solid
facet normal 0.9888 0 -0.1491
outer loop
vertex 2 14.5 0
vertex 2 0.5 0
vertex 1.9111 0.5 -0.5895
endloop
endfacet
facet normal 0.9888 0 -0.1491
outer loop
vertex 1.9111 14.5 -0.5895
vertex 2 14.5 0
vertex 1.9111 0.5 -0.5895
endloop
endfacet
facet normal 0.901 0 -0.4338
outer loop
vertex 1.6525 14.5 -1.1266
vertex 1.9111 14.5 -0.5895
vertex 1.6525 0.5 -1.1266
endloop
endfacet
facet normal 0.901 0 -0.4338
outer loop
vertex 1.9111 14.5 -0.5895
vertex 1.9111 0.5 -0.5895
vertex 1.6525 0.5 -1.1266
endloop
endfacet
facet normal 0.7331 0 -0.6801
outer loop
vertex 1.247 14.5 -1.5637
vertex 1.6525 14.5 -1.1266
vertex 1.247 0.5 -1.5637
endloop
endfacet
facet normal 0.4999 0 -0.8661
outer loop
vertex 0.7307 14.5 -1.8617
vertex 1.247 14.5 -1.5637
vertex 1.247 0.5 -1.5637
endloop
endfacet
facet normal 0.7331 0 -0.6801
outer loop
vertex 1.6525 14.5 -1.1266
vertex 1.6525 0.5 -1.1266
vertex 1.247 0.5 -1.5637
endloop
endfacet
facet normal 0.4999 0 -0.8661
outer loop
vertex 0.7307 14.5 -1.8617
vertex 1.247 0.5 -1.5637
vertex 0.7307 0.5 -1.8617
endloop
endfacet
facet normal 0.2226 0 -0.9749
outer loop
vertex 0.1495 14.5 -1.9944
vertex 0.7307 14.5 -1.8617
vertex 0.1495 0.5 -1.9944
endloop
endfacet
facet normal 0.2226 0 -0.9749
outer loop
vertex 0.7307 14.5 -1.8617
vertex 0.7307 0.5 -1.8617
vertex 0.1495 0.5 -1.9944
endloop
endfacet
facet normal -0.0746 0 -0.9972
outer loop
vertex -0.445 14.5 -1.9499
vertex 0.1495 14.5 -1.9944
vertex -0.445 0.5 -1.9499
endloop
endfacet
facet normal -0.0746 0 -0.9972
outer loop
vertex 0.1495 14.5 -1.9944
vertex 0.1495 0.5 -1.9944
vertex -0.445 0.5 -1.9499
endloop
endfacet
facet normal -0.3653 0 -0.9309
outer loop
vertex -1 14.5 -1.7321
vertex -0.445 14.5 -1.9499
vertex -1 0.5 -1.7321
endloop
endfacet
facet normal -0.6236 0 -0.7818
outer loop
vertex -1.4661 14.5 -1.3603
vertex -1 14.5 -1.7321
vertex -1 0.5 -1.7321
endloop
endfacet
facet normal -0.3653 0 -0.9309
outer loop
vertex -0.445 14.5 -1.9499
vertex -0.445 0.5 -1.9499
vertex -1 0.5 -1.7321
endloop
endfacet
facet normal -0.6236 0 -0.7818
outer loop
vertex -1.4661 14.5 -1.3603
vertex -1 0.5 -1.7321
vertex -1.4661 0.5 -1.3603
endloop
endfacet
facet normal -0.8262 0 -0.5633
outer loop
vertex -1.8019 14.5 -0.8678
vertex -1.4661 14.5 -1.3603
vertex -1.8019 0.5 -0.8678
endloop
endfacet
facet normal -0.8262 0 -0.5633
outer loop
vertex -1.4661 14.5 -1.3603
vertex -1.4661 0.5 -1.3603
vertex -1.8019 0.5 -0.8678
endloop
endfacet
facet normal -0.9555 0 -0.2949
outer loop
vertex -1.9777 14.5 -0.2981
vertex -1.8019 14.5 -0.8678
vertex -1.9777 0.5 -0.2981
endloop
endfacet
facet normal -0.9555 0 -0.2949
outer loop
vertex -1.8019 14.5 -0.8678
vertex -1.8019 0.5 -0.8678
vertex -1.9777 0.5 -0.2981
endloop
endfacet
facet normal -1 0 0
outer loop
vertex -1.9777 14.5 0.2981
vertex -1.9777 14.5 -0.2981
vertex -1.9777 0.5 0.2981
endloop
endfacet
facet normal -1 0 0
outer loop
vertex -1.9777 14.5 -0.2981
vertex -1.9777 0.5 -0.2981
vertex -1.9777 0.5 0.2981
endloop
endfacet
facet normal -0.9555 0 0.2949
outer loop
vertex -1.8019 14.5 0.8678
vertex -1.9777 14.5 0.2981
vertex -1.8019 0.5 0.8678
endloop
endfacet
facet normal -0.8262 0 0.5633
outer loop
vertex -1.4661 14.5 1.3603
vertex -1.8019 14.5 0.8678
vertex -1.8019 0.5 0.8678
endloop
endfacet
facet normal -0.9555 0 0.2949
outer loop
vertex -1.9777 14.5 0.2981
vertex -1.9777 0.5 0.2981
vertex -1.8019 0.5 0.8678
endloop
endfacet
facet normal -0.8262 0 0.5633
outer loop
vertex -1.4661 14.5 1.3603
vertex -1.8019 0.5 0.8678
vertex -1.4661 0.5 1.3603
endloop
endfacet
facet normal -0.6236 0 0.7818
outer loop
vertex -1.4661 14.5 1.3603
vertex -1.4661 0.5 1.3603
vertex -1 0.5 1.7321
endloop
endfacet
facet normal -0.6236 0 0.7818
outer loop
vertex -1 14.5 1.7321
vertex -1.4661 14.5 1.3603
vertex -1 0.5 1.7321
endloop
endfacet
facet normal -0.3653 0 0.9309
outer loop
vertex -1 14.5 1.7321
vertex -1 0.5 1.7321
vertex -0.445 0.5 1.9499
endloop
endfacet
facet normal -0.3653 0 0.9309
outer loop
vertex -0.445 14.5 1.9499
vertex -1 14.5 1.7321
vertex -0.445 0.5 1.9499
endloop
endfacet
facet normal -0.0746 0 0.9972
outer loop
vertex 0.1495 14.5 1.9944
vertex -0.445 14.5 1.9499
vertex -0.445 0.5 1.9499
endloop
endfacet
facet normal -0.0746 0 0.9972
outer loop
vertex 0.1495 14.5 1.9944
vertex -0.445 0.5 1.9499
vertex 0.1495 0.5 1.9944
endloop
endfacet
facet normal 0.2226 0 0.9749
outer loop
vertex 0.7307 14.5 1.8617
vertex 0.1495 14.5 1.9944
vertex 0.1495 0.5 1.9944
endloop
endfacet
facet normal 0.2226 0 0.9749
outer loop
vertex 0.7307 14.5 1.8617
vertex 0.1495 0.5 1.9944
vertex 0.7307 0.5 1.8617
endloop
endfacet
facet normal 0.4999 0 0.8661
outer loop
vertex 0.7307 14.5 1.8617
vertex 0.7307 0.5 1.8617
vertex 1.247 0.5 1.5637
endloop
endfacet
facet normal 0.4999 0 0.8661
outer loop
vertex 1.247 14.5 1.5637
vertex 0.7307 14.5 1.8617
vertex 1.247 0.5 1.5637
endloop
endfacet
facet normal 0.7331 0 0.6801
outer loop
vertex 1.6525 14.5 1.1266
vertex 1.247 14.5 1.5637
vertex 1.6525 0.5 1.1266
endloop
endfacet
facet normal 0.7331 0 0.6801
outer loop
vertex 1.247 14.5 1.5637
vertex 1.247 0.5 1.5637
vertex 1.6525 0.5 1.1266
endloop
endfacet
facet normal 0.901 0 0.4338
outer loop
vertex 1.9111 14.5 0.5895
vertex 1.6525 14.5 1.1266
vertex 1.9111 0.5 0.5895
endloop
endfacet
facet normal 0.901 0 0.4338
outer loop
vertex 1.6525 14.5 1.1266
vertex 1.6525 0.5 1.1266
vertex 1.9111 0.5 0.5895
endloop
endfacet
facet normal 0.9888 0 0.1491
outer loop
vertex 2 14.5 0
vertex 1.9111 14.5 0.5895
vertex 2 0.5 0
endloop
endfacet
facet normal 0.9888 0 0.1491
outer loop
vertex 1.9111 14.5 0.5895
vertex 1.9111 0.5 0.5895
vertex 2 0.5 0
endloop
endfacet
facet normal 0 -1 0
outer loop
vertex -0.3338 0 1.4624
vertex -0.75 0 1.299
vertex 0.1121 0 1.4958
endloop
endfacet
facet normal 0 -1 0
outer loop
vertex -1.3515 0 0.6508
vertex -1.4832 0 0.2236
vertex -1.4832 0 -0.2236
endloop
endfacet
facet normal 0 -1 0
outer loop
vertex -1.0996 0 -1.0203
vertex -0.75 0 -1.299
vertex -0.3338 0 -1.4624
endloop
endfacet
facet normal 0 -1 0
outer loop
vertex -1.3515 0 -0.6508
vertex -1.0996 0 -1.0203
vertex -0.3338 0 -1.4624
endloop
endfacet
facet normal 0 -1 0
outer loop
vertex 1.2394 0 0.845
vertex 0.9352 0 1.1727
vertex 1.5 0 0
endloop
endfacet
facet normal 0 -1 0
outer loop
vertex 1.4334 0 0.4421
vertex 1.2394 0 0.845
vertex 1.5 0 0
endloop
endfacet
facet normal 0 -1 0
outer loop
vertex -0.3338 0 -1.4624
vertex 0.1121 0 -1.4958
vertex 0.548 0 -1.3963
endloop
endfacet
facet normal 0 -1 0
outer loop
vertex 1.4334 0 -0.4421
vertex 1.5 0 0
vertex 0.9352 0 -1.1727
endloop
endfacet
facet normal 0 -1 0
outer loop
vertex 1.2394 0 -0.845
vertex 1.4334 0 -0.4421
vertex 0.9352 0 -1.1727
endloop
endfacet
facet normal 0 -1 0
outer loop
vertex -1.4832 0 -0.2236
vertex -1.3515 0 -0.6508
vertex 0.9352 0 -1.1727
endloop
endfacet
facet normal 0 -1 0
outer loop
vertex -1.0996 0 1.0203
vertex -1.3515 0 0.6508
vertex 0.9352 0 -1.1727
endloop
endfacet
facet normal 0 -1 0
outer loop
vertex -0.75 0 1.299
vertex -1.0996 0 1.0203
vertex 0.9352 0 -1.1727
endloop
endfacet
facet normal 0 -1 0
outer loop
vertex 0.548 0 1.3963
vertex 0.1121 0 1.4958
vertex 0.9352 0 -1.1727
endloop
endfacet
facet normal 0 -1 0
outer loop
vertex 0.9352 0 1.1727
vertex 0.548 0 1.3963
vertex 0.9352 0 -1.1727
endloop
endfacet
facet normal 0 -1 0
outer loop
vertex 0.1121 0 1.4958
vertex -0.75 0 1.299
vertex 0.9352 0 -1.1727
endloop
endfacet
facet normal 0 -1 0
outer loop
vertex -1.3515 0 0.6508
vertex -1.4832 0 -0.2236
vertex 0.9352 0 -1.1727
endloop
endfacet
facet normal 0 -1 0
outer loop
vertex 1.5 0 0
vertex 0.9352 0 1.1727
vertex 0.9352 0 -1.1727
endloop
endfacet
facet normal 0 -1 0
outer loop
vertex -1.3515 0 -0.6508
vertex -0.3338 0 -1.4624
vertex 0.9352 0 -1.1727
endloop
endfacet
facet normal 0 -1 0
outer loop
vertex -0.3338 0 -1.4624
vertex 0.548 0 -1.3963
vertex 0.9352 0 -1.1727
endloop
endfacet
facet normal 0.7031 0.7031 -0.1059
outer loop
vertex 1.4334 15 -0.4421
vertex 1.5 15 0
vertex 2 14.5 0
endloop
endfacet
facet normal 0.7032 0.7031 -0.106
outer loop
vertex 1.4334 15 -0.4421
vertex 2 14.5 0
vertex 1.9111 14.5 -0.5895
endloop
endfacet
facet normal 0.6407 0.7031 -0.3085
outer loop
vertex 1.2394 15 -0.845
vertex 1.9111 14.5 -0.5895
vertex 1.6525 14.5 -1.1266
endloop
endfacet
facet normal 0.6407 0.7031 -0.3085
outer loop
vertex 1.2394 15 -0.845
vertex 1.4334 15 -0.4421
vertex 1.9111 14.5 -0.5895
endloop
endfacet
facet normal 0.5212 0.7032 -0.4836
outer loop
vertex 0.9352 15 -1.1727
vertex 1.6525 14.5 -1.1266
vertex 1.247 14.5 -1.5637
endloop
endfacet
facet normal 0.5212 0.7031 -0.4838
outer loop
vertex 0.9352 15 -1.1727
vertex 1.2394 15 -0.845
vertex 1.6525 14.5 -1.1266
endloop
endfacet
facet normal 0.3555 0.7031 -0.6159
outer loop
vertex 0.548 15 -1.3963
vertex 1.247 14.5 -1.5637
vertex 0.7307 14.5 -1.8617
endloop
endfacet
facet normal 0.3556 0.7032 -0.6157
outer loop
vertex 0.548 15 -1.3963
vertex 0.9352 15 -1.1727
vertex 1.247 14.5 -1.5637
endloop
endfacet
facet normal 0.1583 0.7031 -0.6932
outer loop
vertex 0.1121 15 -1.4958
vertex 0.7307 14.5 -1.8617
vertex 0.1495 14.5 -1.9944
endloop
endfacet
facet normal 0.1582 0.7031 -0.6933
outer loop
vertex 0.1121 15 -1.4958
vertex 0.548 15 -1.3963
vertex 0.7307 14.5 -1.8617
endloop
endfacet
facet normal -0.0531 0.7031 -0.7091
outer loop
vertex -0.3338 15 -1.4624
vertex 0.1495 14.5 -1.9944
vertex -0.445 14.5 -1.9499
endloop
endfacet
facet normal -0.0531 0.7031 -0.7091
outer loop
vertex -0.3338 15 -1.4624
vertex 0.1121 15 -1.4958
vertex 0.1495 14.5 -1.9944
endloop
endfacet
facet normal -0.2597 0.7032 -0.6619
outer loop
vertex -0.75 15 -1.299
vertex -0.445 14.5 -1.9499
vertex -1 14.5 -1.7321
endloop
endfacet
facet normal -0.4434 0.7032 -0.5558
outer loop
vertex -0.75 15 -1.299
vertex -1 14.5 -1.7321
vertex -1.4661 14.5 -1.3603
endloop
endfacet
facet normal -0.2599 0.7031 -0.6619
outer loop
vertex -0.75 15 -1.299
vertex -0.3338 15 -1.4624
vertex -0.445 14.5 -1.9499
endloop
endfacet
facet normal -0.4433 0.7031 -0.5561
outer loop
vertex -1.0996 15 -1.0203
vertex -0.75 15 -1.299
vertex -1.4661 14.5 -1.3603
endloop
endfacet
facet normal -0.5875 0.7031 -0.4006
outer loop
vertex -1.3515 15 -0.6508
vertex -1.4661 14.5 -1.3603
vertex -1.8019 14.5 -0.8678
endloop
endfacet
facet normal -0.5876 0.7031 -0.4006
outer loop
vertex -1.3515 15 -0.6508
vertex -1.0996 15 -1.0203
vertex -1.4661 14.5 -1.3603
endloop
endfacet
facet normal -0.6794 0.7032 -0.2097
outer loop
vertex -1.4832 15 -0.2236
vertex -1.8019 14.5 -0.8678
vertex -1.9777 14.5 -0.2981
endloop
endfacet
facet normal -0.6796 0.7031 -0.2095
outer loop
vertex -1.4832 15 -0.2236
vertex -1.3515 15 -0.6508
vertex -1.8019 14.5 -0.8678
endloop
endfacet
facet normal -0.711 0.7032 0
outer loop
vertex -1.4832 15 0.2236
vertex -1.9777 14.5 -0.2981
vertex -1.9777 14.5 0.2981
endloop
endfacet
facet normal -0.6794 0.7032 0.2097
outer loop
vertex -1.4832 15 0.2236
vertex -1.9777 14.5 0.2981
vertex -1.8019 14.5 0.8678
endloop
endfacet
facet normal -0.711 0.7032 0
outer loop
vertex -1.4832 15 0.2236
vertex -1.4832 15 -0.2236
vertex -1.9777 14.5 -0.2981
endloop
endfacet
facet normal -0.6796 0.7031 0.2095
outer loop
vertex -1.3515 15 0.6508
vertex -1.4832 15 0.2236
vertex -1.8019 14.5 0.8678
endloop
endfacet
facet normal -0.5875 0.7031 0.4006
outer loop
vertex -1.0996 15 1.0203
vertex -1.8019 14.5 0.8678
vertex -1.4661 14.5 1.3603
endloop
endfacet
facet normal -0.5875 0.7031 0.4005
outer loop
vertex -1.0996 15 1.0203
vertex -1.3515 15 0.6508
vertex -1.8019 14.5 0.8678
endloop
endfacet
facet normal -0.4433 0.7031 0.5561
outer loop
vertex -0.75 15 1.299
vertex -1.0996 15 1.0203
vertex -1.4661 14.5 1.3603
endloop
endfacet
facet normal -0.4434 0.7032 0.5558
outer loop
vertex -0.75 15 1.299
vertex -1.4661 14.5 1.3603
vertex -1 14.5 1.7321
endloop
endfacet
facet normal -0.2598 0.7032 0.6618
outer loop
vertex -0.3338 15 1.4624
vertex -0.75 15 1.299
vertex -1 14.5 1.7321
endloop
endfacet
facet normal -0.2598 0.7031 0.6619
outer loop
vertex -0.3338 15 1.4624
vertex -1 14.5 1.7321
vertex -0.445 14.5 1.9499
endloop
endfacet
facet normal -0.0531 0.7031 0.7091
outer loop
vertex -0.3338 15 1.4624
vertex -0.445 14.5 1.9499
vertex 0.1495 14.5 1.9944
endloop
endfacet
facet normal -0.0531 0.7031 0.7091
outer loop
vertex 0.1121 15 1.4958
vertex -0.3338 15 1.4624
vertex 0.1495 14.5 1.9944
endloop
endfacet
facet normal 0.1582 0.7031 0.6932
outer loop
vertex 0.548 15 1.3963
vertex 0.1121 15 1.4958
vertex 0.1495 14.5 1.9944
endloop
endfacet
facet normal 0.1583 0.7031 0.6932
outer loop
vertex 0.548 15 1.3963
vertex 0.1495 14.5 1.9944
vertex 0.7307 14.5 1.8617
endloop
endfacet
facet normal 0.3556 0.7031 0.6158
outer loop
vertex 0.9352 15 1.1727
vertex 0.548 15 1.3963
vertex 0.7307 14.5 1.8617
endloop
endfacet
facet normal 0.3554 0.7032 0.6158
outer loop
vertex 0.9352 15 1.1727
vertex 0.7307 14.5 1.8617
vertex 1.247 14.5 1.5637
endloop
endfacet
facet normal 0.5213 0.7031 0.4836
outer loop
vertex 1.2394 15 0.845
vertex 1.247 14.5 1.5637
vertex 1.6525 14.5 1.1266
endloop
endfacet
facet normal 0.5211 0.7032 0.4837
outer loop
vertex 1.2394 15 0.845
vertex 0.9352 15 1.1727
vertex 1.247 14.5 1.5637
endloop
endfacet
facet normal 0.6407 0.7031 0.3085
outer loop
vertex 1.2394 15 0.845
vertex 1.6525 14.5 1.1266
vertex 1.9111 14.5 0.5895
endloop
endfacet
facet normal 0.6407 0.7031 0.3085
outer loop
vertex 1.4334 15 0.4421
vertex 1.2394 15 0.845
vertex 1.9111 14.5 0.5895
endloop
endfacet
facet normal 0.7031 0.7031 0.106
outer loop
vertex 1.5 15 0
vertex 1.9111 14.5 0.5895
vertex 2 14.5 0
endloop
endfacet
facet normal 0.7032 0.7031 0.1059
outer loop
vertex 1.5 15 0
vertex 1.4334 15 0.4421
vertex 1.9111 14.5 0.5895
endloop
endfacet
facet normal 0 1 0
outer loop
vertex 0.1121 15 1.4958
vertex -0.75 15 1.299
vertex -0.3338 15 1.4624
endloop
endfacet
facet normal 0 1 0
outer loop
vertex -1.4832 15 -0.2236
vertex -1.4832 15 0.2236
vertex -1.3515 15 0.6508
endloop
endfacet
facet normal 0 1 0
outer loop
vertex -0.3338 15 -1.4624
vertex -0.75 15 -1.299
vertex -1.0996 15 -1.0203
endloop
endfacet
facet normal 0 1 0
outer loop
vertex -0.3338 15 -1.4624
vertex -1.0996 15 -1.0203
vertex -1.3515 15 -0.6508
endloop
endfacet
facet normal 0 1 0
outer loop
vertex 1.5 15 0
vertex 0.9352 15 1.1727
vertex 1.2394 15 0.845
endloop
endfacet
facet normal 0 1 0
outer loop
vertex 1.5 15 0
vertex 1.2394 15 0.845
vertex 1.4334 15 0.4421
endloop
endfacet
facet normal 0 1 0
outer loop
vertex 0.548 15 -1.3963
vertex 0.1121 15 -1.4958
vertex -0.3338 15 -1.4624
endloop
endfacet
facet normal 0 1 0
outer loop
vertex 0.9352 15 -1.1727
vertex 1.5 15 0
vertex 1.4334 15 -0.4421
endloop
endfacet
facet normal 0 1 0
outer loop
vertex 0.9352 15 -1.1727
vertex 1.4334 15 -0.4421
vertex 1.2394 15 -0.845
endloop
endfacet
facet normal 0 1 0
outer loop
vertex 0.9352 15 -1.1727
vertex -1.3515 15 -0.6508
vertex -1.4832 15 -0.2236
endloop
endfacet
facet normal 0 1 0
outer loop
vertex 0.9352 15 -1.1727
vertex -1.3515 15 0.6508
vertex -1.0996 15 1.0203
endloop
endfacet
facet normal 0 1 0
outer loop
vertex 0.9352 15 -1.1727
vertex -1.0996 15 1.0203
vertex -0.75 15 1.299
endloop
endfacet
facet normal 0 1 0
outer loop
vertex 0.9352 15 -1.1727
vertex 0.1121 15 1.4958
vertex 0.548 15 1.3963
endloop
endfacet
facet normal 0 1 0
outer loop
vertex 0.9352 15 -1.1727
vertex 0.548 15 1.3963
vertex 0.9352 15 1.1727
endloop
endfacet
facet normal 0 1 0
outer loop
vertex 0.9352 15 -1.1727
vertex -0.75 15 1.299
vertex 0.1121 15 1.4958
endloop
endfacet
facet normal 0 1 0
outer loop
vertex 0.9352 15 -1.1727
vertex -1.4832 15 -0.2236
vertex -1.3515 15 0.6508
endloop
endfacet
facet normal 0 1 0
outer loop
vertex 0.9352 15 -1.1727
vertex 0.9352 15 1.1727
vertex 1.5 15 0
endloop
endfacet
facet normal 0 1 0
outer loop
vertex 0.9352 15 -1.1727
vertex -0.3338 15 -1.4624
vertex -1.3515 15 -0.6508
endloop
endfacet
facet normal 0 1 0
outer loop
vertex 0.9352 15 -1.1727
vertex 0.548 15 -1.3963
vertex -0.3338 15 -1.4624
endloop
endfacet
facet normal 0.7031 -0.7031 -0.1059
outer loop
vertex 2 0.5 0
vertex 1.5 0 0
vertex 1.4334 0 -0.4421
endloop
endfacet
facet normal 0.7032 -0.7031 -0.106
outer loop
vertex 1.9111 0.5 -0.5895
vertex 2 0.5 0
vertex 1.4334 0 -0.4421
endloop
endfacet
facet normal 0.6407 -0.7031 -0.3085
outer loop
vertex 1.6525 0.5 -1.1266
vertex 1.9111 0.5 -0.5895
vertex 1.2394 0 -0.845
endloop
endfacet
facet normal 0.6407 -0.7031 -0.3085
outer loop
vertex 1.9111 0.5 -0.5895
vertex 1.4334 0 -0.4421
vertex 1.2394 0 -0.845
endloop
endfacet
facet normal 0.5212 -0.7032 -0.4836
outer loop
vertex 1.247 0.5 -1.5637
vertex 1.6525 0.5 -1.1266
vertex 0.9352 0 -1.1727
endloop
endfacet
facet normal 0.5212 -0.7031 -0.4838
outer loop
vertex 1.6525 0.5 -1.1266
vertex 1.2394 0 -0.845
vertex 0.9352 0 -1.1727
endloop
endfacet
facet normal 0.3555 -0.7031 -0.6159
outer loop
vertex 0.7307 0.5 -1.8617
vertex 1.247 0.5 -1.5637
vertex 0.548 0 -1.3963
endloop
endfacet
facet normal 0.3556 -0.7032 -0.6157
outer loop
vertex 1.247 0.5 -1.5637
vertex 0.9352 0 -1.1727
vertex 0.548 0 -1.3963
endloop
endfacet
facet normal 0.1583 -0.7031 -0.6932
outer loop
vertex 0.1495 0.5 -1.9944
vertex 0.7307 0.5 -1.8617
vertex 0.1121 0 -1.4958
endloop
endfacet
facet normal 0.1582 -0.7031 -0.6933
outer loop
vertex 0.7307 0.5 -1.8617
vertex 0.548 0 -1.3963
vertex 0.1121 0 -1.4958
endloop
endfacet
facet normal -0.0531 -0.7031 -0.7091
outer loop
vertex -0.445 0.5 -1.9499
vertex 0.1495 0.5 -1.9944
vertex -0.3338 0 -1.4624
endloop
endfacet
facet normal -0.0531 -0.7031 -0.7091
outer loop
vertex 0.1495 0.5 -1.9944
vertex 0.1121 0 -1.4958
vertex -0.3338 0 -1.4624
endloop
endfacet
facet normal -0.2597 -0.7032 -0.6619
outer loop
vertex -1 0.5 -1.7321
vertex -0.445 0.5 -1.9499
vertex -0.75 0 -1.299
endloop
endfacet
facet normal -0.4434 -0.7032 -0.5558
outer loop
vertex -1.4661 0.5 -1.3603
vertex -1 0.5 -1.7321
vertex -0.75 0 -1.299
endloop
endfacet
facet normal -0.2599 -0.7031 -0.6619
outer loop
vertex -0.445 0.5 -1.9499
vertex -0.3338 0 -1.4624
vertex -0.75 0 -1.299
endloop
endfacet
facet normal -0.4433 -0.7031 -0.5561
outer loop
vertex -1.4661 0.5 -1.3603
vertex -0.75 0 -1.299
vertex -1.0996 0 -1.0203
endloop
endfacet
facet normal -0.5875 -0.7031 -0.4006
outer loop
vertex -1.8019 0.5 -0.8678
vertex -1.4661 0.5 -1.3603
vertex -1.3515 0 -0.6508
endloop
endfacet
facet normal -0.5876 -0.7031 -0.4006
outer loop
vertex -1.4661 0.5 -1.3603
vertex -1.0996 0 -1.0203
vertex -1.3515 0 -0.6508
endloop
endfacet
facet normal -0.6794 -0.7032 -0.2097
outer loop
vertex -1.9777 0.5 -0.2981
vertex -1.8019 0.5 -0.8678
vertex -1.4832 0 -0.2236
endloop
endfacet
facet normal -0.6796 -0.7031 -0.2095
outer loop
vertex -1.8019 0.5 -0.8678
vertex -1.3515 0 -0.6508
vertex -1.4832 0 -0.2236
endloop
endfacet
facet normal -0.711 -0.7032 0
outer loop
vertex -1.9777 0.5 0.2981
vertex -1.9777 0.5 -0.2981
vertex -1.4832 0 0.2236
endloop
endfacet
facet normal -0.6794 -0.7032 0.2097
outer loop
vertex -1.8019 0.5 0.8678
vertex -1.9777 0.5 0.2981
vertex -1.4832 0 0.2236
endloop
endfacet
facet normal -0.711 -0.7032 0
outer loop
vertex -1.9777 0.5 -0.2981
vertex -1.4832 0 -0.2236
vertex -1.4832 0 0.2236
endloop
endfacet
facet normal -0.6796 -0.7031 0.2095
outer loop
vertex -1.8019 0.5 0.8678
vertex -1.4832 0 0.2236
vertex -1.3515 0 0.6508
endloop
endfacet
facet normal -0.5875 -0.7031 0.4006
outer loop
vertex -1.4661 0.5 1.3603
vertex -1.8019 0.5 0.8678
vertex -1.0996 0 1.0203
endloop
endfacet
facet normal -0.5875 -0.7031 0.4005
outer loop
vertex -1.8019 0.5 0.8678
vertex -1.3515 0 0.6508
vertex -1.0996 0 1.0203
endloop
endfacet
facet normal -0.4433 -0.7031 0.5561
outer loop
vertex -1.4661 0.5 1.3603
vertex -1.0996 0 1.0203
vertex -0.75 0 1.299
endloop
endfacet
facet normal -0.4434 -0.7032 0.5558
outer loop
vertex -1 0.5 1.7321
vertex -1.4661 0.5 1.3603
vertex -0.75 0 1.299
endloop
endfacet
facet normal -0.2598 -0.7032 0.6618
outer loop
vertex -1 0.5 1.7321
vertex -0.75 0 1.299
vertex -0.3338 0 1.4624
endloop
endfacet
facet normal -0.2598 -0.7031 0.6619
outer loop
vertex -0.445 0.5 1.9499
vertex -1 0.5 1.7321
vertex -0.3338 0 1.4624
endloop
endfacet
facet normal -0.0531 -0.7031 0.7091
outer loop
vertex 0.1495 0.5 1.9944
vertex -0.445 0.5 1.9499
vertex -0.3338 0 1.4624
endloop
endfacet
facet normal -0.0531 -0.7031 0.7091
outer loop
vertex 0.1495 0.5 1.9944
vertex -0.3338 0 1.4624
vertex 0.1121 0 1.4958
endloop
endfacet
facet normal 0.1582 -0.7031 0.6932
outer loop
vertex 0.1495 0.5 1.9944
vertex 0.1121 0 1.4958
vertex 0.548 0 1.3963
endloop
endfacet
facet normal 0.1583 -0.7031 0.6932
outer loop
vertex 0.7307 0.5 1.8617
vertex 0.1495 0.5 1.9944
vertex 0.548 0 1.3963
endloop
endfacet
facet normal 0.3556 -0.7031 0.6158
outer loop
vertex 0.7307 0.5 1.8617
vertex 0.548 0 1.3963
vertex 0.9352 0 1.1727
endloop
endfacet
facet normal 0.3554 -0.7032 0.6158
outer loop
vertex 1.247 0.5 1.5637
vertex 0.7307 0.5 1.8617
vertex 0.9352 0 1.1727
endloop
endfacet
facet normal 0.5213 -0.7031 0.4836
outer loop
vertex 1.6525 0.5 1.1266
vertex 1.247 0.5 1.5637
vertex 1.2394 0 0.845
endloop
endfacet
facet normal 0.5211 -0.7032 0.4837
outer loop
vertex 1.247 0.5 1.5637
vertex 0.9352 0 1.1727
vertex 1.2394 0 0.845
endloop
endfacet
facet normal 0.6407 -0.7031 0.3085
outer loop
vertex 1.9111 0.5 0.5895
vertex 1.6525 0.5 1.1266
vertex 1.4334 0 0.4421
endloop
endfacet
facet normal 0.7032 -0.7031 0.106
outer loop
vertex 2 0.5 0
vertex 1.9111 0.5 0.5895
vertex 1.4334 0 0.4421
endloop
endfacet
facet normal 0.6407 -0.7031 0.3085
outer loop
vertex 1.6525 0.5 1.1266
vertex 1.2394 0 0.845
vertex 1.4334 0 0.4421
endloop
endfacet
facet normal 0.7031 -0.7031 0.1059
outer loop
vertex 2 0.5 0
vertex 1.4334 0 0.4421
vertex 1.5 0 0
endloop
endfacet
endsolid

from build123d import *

# Parameters (mm, degrees)
SKETCH_1_R      = 2
EXTRUDE_1_DEPTH = 15
CHAMFER_1_SIZE  = 0.5
CHAMFER_2_SIZE  = 0.5


with BuildPart() as part:
    # 草圖1 → 填料-伸長1 (new body)
    with BuildSketch(Plane(origin=(0, 0, 0), x_dir=(1, 0, 0), z_dir=(0, 1, 0))):
        Circle(SKETCH_1_R)
    extrude(amount=EXTRUDE_1_DEPTH)

    # 導角1
    chamfer_1_edges = [part.edges().sort_by_distance(p)[0] for p in [
        (-2, 15, 0),
    ]]
    chamfer(chamfer_1_edges, length=CHAMFER_1_SIZE)

    # 導角2
    chamfer_2_edges = [part.edges().sort_by_distance(p)[0] for p in [
        (-2, 0, 0),
    ]]
    chamfer(chamfer_2_edges, length=CHAMFER_2_SIZE)


solid = part.part
